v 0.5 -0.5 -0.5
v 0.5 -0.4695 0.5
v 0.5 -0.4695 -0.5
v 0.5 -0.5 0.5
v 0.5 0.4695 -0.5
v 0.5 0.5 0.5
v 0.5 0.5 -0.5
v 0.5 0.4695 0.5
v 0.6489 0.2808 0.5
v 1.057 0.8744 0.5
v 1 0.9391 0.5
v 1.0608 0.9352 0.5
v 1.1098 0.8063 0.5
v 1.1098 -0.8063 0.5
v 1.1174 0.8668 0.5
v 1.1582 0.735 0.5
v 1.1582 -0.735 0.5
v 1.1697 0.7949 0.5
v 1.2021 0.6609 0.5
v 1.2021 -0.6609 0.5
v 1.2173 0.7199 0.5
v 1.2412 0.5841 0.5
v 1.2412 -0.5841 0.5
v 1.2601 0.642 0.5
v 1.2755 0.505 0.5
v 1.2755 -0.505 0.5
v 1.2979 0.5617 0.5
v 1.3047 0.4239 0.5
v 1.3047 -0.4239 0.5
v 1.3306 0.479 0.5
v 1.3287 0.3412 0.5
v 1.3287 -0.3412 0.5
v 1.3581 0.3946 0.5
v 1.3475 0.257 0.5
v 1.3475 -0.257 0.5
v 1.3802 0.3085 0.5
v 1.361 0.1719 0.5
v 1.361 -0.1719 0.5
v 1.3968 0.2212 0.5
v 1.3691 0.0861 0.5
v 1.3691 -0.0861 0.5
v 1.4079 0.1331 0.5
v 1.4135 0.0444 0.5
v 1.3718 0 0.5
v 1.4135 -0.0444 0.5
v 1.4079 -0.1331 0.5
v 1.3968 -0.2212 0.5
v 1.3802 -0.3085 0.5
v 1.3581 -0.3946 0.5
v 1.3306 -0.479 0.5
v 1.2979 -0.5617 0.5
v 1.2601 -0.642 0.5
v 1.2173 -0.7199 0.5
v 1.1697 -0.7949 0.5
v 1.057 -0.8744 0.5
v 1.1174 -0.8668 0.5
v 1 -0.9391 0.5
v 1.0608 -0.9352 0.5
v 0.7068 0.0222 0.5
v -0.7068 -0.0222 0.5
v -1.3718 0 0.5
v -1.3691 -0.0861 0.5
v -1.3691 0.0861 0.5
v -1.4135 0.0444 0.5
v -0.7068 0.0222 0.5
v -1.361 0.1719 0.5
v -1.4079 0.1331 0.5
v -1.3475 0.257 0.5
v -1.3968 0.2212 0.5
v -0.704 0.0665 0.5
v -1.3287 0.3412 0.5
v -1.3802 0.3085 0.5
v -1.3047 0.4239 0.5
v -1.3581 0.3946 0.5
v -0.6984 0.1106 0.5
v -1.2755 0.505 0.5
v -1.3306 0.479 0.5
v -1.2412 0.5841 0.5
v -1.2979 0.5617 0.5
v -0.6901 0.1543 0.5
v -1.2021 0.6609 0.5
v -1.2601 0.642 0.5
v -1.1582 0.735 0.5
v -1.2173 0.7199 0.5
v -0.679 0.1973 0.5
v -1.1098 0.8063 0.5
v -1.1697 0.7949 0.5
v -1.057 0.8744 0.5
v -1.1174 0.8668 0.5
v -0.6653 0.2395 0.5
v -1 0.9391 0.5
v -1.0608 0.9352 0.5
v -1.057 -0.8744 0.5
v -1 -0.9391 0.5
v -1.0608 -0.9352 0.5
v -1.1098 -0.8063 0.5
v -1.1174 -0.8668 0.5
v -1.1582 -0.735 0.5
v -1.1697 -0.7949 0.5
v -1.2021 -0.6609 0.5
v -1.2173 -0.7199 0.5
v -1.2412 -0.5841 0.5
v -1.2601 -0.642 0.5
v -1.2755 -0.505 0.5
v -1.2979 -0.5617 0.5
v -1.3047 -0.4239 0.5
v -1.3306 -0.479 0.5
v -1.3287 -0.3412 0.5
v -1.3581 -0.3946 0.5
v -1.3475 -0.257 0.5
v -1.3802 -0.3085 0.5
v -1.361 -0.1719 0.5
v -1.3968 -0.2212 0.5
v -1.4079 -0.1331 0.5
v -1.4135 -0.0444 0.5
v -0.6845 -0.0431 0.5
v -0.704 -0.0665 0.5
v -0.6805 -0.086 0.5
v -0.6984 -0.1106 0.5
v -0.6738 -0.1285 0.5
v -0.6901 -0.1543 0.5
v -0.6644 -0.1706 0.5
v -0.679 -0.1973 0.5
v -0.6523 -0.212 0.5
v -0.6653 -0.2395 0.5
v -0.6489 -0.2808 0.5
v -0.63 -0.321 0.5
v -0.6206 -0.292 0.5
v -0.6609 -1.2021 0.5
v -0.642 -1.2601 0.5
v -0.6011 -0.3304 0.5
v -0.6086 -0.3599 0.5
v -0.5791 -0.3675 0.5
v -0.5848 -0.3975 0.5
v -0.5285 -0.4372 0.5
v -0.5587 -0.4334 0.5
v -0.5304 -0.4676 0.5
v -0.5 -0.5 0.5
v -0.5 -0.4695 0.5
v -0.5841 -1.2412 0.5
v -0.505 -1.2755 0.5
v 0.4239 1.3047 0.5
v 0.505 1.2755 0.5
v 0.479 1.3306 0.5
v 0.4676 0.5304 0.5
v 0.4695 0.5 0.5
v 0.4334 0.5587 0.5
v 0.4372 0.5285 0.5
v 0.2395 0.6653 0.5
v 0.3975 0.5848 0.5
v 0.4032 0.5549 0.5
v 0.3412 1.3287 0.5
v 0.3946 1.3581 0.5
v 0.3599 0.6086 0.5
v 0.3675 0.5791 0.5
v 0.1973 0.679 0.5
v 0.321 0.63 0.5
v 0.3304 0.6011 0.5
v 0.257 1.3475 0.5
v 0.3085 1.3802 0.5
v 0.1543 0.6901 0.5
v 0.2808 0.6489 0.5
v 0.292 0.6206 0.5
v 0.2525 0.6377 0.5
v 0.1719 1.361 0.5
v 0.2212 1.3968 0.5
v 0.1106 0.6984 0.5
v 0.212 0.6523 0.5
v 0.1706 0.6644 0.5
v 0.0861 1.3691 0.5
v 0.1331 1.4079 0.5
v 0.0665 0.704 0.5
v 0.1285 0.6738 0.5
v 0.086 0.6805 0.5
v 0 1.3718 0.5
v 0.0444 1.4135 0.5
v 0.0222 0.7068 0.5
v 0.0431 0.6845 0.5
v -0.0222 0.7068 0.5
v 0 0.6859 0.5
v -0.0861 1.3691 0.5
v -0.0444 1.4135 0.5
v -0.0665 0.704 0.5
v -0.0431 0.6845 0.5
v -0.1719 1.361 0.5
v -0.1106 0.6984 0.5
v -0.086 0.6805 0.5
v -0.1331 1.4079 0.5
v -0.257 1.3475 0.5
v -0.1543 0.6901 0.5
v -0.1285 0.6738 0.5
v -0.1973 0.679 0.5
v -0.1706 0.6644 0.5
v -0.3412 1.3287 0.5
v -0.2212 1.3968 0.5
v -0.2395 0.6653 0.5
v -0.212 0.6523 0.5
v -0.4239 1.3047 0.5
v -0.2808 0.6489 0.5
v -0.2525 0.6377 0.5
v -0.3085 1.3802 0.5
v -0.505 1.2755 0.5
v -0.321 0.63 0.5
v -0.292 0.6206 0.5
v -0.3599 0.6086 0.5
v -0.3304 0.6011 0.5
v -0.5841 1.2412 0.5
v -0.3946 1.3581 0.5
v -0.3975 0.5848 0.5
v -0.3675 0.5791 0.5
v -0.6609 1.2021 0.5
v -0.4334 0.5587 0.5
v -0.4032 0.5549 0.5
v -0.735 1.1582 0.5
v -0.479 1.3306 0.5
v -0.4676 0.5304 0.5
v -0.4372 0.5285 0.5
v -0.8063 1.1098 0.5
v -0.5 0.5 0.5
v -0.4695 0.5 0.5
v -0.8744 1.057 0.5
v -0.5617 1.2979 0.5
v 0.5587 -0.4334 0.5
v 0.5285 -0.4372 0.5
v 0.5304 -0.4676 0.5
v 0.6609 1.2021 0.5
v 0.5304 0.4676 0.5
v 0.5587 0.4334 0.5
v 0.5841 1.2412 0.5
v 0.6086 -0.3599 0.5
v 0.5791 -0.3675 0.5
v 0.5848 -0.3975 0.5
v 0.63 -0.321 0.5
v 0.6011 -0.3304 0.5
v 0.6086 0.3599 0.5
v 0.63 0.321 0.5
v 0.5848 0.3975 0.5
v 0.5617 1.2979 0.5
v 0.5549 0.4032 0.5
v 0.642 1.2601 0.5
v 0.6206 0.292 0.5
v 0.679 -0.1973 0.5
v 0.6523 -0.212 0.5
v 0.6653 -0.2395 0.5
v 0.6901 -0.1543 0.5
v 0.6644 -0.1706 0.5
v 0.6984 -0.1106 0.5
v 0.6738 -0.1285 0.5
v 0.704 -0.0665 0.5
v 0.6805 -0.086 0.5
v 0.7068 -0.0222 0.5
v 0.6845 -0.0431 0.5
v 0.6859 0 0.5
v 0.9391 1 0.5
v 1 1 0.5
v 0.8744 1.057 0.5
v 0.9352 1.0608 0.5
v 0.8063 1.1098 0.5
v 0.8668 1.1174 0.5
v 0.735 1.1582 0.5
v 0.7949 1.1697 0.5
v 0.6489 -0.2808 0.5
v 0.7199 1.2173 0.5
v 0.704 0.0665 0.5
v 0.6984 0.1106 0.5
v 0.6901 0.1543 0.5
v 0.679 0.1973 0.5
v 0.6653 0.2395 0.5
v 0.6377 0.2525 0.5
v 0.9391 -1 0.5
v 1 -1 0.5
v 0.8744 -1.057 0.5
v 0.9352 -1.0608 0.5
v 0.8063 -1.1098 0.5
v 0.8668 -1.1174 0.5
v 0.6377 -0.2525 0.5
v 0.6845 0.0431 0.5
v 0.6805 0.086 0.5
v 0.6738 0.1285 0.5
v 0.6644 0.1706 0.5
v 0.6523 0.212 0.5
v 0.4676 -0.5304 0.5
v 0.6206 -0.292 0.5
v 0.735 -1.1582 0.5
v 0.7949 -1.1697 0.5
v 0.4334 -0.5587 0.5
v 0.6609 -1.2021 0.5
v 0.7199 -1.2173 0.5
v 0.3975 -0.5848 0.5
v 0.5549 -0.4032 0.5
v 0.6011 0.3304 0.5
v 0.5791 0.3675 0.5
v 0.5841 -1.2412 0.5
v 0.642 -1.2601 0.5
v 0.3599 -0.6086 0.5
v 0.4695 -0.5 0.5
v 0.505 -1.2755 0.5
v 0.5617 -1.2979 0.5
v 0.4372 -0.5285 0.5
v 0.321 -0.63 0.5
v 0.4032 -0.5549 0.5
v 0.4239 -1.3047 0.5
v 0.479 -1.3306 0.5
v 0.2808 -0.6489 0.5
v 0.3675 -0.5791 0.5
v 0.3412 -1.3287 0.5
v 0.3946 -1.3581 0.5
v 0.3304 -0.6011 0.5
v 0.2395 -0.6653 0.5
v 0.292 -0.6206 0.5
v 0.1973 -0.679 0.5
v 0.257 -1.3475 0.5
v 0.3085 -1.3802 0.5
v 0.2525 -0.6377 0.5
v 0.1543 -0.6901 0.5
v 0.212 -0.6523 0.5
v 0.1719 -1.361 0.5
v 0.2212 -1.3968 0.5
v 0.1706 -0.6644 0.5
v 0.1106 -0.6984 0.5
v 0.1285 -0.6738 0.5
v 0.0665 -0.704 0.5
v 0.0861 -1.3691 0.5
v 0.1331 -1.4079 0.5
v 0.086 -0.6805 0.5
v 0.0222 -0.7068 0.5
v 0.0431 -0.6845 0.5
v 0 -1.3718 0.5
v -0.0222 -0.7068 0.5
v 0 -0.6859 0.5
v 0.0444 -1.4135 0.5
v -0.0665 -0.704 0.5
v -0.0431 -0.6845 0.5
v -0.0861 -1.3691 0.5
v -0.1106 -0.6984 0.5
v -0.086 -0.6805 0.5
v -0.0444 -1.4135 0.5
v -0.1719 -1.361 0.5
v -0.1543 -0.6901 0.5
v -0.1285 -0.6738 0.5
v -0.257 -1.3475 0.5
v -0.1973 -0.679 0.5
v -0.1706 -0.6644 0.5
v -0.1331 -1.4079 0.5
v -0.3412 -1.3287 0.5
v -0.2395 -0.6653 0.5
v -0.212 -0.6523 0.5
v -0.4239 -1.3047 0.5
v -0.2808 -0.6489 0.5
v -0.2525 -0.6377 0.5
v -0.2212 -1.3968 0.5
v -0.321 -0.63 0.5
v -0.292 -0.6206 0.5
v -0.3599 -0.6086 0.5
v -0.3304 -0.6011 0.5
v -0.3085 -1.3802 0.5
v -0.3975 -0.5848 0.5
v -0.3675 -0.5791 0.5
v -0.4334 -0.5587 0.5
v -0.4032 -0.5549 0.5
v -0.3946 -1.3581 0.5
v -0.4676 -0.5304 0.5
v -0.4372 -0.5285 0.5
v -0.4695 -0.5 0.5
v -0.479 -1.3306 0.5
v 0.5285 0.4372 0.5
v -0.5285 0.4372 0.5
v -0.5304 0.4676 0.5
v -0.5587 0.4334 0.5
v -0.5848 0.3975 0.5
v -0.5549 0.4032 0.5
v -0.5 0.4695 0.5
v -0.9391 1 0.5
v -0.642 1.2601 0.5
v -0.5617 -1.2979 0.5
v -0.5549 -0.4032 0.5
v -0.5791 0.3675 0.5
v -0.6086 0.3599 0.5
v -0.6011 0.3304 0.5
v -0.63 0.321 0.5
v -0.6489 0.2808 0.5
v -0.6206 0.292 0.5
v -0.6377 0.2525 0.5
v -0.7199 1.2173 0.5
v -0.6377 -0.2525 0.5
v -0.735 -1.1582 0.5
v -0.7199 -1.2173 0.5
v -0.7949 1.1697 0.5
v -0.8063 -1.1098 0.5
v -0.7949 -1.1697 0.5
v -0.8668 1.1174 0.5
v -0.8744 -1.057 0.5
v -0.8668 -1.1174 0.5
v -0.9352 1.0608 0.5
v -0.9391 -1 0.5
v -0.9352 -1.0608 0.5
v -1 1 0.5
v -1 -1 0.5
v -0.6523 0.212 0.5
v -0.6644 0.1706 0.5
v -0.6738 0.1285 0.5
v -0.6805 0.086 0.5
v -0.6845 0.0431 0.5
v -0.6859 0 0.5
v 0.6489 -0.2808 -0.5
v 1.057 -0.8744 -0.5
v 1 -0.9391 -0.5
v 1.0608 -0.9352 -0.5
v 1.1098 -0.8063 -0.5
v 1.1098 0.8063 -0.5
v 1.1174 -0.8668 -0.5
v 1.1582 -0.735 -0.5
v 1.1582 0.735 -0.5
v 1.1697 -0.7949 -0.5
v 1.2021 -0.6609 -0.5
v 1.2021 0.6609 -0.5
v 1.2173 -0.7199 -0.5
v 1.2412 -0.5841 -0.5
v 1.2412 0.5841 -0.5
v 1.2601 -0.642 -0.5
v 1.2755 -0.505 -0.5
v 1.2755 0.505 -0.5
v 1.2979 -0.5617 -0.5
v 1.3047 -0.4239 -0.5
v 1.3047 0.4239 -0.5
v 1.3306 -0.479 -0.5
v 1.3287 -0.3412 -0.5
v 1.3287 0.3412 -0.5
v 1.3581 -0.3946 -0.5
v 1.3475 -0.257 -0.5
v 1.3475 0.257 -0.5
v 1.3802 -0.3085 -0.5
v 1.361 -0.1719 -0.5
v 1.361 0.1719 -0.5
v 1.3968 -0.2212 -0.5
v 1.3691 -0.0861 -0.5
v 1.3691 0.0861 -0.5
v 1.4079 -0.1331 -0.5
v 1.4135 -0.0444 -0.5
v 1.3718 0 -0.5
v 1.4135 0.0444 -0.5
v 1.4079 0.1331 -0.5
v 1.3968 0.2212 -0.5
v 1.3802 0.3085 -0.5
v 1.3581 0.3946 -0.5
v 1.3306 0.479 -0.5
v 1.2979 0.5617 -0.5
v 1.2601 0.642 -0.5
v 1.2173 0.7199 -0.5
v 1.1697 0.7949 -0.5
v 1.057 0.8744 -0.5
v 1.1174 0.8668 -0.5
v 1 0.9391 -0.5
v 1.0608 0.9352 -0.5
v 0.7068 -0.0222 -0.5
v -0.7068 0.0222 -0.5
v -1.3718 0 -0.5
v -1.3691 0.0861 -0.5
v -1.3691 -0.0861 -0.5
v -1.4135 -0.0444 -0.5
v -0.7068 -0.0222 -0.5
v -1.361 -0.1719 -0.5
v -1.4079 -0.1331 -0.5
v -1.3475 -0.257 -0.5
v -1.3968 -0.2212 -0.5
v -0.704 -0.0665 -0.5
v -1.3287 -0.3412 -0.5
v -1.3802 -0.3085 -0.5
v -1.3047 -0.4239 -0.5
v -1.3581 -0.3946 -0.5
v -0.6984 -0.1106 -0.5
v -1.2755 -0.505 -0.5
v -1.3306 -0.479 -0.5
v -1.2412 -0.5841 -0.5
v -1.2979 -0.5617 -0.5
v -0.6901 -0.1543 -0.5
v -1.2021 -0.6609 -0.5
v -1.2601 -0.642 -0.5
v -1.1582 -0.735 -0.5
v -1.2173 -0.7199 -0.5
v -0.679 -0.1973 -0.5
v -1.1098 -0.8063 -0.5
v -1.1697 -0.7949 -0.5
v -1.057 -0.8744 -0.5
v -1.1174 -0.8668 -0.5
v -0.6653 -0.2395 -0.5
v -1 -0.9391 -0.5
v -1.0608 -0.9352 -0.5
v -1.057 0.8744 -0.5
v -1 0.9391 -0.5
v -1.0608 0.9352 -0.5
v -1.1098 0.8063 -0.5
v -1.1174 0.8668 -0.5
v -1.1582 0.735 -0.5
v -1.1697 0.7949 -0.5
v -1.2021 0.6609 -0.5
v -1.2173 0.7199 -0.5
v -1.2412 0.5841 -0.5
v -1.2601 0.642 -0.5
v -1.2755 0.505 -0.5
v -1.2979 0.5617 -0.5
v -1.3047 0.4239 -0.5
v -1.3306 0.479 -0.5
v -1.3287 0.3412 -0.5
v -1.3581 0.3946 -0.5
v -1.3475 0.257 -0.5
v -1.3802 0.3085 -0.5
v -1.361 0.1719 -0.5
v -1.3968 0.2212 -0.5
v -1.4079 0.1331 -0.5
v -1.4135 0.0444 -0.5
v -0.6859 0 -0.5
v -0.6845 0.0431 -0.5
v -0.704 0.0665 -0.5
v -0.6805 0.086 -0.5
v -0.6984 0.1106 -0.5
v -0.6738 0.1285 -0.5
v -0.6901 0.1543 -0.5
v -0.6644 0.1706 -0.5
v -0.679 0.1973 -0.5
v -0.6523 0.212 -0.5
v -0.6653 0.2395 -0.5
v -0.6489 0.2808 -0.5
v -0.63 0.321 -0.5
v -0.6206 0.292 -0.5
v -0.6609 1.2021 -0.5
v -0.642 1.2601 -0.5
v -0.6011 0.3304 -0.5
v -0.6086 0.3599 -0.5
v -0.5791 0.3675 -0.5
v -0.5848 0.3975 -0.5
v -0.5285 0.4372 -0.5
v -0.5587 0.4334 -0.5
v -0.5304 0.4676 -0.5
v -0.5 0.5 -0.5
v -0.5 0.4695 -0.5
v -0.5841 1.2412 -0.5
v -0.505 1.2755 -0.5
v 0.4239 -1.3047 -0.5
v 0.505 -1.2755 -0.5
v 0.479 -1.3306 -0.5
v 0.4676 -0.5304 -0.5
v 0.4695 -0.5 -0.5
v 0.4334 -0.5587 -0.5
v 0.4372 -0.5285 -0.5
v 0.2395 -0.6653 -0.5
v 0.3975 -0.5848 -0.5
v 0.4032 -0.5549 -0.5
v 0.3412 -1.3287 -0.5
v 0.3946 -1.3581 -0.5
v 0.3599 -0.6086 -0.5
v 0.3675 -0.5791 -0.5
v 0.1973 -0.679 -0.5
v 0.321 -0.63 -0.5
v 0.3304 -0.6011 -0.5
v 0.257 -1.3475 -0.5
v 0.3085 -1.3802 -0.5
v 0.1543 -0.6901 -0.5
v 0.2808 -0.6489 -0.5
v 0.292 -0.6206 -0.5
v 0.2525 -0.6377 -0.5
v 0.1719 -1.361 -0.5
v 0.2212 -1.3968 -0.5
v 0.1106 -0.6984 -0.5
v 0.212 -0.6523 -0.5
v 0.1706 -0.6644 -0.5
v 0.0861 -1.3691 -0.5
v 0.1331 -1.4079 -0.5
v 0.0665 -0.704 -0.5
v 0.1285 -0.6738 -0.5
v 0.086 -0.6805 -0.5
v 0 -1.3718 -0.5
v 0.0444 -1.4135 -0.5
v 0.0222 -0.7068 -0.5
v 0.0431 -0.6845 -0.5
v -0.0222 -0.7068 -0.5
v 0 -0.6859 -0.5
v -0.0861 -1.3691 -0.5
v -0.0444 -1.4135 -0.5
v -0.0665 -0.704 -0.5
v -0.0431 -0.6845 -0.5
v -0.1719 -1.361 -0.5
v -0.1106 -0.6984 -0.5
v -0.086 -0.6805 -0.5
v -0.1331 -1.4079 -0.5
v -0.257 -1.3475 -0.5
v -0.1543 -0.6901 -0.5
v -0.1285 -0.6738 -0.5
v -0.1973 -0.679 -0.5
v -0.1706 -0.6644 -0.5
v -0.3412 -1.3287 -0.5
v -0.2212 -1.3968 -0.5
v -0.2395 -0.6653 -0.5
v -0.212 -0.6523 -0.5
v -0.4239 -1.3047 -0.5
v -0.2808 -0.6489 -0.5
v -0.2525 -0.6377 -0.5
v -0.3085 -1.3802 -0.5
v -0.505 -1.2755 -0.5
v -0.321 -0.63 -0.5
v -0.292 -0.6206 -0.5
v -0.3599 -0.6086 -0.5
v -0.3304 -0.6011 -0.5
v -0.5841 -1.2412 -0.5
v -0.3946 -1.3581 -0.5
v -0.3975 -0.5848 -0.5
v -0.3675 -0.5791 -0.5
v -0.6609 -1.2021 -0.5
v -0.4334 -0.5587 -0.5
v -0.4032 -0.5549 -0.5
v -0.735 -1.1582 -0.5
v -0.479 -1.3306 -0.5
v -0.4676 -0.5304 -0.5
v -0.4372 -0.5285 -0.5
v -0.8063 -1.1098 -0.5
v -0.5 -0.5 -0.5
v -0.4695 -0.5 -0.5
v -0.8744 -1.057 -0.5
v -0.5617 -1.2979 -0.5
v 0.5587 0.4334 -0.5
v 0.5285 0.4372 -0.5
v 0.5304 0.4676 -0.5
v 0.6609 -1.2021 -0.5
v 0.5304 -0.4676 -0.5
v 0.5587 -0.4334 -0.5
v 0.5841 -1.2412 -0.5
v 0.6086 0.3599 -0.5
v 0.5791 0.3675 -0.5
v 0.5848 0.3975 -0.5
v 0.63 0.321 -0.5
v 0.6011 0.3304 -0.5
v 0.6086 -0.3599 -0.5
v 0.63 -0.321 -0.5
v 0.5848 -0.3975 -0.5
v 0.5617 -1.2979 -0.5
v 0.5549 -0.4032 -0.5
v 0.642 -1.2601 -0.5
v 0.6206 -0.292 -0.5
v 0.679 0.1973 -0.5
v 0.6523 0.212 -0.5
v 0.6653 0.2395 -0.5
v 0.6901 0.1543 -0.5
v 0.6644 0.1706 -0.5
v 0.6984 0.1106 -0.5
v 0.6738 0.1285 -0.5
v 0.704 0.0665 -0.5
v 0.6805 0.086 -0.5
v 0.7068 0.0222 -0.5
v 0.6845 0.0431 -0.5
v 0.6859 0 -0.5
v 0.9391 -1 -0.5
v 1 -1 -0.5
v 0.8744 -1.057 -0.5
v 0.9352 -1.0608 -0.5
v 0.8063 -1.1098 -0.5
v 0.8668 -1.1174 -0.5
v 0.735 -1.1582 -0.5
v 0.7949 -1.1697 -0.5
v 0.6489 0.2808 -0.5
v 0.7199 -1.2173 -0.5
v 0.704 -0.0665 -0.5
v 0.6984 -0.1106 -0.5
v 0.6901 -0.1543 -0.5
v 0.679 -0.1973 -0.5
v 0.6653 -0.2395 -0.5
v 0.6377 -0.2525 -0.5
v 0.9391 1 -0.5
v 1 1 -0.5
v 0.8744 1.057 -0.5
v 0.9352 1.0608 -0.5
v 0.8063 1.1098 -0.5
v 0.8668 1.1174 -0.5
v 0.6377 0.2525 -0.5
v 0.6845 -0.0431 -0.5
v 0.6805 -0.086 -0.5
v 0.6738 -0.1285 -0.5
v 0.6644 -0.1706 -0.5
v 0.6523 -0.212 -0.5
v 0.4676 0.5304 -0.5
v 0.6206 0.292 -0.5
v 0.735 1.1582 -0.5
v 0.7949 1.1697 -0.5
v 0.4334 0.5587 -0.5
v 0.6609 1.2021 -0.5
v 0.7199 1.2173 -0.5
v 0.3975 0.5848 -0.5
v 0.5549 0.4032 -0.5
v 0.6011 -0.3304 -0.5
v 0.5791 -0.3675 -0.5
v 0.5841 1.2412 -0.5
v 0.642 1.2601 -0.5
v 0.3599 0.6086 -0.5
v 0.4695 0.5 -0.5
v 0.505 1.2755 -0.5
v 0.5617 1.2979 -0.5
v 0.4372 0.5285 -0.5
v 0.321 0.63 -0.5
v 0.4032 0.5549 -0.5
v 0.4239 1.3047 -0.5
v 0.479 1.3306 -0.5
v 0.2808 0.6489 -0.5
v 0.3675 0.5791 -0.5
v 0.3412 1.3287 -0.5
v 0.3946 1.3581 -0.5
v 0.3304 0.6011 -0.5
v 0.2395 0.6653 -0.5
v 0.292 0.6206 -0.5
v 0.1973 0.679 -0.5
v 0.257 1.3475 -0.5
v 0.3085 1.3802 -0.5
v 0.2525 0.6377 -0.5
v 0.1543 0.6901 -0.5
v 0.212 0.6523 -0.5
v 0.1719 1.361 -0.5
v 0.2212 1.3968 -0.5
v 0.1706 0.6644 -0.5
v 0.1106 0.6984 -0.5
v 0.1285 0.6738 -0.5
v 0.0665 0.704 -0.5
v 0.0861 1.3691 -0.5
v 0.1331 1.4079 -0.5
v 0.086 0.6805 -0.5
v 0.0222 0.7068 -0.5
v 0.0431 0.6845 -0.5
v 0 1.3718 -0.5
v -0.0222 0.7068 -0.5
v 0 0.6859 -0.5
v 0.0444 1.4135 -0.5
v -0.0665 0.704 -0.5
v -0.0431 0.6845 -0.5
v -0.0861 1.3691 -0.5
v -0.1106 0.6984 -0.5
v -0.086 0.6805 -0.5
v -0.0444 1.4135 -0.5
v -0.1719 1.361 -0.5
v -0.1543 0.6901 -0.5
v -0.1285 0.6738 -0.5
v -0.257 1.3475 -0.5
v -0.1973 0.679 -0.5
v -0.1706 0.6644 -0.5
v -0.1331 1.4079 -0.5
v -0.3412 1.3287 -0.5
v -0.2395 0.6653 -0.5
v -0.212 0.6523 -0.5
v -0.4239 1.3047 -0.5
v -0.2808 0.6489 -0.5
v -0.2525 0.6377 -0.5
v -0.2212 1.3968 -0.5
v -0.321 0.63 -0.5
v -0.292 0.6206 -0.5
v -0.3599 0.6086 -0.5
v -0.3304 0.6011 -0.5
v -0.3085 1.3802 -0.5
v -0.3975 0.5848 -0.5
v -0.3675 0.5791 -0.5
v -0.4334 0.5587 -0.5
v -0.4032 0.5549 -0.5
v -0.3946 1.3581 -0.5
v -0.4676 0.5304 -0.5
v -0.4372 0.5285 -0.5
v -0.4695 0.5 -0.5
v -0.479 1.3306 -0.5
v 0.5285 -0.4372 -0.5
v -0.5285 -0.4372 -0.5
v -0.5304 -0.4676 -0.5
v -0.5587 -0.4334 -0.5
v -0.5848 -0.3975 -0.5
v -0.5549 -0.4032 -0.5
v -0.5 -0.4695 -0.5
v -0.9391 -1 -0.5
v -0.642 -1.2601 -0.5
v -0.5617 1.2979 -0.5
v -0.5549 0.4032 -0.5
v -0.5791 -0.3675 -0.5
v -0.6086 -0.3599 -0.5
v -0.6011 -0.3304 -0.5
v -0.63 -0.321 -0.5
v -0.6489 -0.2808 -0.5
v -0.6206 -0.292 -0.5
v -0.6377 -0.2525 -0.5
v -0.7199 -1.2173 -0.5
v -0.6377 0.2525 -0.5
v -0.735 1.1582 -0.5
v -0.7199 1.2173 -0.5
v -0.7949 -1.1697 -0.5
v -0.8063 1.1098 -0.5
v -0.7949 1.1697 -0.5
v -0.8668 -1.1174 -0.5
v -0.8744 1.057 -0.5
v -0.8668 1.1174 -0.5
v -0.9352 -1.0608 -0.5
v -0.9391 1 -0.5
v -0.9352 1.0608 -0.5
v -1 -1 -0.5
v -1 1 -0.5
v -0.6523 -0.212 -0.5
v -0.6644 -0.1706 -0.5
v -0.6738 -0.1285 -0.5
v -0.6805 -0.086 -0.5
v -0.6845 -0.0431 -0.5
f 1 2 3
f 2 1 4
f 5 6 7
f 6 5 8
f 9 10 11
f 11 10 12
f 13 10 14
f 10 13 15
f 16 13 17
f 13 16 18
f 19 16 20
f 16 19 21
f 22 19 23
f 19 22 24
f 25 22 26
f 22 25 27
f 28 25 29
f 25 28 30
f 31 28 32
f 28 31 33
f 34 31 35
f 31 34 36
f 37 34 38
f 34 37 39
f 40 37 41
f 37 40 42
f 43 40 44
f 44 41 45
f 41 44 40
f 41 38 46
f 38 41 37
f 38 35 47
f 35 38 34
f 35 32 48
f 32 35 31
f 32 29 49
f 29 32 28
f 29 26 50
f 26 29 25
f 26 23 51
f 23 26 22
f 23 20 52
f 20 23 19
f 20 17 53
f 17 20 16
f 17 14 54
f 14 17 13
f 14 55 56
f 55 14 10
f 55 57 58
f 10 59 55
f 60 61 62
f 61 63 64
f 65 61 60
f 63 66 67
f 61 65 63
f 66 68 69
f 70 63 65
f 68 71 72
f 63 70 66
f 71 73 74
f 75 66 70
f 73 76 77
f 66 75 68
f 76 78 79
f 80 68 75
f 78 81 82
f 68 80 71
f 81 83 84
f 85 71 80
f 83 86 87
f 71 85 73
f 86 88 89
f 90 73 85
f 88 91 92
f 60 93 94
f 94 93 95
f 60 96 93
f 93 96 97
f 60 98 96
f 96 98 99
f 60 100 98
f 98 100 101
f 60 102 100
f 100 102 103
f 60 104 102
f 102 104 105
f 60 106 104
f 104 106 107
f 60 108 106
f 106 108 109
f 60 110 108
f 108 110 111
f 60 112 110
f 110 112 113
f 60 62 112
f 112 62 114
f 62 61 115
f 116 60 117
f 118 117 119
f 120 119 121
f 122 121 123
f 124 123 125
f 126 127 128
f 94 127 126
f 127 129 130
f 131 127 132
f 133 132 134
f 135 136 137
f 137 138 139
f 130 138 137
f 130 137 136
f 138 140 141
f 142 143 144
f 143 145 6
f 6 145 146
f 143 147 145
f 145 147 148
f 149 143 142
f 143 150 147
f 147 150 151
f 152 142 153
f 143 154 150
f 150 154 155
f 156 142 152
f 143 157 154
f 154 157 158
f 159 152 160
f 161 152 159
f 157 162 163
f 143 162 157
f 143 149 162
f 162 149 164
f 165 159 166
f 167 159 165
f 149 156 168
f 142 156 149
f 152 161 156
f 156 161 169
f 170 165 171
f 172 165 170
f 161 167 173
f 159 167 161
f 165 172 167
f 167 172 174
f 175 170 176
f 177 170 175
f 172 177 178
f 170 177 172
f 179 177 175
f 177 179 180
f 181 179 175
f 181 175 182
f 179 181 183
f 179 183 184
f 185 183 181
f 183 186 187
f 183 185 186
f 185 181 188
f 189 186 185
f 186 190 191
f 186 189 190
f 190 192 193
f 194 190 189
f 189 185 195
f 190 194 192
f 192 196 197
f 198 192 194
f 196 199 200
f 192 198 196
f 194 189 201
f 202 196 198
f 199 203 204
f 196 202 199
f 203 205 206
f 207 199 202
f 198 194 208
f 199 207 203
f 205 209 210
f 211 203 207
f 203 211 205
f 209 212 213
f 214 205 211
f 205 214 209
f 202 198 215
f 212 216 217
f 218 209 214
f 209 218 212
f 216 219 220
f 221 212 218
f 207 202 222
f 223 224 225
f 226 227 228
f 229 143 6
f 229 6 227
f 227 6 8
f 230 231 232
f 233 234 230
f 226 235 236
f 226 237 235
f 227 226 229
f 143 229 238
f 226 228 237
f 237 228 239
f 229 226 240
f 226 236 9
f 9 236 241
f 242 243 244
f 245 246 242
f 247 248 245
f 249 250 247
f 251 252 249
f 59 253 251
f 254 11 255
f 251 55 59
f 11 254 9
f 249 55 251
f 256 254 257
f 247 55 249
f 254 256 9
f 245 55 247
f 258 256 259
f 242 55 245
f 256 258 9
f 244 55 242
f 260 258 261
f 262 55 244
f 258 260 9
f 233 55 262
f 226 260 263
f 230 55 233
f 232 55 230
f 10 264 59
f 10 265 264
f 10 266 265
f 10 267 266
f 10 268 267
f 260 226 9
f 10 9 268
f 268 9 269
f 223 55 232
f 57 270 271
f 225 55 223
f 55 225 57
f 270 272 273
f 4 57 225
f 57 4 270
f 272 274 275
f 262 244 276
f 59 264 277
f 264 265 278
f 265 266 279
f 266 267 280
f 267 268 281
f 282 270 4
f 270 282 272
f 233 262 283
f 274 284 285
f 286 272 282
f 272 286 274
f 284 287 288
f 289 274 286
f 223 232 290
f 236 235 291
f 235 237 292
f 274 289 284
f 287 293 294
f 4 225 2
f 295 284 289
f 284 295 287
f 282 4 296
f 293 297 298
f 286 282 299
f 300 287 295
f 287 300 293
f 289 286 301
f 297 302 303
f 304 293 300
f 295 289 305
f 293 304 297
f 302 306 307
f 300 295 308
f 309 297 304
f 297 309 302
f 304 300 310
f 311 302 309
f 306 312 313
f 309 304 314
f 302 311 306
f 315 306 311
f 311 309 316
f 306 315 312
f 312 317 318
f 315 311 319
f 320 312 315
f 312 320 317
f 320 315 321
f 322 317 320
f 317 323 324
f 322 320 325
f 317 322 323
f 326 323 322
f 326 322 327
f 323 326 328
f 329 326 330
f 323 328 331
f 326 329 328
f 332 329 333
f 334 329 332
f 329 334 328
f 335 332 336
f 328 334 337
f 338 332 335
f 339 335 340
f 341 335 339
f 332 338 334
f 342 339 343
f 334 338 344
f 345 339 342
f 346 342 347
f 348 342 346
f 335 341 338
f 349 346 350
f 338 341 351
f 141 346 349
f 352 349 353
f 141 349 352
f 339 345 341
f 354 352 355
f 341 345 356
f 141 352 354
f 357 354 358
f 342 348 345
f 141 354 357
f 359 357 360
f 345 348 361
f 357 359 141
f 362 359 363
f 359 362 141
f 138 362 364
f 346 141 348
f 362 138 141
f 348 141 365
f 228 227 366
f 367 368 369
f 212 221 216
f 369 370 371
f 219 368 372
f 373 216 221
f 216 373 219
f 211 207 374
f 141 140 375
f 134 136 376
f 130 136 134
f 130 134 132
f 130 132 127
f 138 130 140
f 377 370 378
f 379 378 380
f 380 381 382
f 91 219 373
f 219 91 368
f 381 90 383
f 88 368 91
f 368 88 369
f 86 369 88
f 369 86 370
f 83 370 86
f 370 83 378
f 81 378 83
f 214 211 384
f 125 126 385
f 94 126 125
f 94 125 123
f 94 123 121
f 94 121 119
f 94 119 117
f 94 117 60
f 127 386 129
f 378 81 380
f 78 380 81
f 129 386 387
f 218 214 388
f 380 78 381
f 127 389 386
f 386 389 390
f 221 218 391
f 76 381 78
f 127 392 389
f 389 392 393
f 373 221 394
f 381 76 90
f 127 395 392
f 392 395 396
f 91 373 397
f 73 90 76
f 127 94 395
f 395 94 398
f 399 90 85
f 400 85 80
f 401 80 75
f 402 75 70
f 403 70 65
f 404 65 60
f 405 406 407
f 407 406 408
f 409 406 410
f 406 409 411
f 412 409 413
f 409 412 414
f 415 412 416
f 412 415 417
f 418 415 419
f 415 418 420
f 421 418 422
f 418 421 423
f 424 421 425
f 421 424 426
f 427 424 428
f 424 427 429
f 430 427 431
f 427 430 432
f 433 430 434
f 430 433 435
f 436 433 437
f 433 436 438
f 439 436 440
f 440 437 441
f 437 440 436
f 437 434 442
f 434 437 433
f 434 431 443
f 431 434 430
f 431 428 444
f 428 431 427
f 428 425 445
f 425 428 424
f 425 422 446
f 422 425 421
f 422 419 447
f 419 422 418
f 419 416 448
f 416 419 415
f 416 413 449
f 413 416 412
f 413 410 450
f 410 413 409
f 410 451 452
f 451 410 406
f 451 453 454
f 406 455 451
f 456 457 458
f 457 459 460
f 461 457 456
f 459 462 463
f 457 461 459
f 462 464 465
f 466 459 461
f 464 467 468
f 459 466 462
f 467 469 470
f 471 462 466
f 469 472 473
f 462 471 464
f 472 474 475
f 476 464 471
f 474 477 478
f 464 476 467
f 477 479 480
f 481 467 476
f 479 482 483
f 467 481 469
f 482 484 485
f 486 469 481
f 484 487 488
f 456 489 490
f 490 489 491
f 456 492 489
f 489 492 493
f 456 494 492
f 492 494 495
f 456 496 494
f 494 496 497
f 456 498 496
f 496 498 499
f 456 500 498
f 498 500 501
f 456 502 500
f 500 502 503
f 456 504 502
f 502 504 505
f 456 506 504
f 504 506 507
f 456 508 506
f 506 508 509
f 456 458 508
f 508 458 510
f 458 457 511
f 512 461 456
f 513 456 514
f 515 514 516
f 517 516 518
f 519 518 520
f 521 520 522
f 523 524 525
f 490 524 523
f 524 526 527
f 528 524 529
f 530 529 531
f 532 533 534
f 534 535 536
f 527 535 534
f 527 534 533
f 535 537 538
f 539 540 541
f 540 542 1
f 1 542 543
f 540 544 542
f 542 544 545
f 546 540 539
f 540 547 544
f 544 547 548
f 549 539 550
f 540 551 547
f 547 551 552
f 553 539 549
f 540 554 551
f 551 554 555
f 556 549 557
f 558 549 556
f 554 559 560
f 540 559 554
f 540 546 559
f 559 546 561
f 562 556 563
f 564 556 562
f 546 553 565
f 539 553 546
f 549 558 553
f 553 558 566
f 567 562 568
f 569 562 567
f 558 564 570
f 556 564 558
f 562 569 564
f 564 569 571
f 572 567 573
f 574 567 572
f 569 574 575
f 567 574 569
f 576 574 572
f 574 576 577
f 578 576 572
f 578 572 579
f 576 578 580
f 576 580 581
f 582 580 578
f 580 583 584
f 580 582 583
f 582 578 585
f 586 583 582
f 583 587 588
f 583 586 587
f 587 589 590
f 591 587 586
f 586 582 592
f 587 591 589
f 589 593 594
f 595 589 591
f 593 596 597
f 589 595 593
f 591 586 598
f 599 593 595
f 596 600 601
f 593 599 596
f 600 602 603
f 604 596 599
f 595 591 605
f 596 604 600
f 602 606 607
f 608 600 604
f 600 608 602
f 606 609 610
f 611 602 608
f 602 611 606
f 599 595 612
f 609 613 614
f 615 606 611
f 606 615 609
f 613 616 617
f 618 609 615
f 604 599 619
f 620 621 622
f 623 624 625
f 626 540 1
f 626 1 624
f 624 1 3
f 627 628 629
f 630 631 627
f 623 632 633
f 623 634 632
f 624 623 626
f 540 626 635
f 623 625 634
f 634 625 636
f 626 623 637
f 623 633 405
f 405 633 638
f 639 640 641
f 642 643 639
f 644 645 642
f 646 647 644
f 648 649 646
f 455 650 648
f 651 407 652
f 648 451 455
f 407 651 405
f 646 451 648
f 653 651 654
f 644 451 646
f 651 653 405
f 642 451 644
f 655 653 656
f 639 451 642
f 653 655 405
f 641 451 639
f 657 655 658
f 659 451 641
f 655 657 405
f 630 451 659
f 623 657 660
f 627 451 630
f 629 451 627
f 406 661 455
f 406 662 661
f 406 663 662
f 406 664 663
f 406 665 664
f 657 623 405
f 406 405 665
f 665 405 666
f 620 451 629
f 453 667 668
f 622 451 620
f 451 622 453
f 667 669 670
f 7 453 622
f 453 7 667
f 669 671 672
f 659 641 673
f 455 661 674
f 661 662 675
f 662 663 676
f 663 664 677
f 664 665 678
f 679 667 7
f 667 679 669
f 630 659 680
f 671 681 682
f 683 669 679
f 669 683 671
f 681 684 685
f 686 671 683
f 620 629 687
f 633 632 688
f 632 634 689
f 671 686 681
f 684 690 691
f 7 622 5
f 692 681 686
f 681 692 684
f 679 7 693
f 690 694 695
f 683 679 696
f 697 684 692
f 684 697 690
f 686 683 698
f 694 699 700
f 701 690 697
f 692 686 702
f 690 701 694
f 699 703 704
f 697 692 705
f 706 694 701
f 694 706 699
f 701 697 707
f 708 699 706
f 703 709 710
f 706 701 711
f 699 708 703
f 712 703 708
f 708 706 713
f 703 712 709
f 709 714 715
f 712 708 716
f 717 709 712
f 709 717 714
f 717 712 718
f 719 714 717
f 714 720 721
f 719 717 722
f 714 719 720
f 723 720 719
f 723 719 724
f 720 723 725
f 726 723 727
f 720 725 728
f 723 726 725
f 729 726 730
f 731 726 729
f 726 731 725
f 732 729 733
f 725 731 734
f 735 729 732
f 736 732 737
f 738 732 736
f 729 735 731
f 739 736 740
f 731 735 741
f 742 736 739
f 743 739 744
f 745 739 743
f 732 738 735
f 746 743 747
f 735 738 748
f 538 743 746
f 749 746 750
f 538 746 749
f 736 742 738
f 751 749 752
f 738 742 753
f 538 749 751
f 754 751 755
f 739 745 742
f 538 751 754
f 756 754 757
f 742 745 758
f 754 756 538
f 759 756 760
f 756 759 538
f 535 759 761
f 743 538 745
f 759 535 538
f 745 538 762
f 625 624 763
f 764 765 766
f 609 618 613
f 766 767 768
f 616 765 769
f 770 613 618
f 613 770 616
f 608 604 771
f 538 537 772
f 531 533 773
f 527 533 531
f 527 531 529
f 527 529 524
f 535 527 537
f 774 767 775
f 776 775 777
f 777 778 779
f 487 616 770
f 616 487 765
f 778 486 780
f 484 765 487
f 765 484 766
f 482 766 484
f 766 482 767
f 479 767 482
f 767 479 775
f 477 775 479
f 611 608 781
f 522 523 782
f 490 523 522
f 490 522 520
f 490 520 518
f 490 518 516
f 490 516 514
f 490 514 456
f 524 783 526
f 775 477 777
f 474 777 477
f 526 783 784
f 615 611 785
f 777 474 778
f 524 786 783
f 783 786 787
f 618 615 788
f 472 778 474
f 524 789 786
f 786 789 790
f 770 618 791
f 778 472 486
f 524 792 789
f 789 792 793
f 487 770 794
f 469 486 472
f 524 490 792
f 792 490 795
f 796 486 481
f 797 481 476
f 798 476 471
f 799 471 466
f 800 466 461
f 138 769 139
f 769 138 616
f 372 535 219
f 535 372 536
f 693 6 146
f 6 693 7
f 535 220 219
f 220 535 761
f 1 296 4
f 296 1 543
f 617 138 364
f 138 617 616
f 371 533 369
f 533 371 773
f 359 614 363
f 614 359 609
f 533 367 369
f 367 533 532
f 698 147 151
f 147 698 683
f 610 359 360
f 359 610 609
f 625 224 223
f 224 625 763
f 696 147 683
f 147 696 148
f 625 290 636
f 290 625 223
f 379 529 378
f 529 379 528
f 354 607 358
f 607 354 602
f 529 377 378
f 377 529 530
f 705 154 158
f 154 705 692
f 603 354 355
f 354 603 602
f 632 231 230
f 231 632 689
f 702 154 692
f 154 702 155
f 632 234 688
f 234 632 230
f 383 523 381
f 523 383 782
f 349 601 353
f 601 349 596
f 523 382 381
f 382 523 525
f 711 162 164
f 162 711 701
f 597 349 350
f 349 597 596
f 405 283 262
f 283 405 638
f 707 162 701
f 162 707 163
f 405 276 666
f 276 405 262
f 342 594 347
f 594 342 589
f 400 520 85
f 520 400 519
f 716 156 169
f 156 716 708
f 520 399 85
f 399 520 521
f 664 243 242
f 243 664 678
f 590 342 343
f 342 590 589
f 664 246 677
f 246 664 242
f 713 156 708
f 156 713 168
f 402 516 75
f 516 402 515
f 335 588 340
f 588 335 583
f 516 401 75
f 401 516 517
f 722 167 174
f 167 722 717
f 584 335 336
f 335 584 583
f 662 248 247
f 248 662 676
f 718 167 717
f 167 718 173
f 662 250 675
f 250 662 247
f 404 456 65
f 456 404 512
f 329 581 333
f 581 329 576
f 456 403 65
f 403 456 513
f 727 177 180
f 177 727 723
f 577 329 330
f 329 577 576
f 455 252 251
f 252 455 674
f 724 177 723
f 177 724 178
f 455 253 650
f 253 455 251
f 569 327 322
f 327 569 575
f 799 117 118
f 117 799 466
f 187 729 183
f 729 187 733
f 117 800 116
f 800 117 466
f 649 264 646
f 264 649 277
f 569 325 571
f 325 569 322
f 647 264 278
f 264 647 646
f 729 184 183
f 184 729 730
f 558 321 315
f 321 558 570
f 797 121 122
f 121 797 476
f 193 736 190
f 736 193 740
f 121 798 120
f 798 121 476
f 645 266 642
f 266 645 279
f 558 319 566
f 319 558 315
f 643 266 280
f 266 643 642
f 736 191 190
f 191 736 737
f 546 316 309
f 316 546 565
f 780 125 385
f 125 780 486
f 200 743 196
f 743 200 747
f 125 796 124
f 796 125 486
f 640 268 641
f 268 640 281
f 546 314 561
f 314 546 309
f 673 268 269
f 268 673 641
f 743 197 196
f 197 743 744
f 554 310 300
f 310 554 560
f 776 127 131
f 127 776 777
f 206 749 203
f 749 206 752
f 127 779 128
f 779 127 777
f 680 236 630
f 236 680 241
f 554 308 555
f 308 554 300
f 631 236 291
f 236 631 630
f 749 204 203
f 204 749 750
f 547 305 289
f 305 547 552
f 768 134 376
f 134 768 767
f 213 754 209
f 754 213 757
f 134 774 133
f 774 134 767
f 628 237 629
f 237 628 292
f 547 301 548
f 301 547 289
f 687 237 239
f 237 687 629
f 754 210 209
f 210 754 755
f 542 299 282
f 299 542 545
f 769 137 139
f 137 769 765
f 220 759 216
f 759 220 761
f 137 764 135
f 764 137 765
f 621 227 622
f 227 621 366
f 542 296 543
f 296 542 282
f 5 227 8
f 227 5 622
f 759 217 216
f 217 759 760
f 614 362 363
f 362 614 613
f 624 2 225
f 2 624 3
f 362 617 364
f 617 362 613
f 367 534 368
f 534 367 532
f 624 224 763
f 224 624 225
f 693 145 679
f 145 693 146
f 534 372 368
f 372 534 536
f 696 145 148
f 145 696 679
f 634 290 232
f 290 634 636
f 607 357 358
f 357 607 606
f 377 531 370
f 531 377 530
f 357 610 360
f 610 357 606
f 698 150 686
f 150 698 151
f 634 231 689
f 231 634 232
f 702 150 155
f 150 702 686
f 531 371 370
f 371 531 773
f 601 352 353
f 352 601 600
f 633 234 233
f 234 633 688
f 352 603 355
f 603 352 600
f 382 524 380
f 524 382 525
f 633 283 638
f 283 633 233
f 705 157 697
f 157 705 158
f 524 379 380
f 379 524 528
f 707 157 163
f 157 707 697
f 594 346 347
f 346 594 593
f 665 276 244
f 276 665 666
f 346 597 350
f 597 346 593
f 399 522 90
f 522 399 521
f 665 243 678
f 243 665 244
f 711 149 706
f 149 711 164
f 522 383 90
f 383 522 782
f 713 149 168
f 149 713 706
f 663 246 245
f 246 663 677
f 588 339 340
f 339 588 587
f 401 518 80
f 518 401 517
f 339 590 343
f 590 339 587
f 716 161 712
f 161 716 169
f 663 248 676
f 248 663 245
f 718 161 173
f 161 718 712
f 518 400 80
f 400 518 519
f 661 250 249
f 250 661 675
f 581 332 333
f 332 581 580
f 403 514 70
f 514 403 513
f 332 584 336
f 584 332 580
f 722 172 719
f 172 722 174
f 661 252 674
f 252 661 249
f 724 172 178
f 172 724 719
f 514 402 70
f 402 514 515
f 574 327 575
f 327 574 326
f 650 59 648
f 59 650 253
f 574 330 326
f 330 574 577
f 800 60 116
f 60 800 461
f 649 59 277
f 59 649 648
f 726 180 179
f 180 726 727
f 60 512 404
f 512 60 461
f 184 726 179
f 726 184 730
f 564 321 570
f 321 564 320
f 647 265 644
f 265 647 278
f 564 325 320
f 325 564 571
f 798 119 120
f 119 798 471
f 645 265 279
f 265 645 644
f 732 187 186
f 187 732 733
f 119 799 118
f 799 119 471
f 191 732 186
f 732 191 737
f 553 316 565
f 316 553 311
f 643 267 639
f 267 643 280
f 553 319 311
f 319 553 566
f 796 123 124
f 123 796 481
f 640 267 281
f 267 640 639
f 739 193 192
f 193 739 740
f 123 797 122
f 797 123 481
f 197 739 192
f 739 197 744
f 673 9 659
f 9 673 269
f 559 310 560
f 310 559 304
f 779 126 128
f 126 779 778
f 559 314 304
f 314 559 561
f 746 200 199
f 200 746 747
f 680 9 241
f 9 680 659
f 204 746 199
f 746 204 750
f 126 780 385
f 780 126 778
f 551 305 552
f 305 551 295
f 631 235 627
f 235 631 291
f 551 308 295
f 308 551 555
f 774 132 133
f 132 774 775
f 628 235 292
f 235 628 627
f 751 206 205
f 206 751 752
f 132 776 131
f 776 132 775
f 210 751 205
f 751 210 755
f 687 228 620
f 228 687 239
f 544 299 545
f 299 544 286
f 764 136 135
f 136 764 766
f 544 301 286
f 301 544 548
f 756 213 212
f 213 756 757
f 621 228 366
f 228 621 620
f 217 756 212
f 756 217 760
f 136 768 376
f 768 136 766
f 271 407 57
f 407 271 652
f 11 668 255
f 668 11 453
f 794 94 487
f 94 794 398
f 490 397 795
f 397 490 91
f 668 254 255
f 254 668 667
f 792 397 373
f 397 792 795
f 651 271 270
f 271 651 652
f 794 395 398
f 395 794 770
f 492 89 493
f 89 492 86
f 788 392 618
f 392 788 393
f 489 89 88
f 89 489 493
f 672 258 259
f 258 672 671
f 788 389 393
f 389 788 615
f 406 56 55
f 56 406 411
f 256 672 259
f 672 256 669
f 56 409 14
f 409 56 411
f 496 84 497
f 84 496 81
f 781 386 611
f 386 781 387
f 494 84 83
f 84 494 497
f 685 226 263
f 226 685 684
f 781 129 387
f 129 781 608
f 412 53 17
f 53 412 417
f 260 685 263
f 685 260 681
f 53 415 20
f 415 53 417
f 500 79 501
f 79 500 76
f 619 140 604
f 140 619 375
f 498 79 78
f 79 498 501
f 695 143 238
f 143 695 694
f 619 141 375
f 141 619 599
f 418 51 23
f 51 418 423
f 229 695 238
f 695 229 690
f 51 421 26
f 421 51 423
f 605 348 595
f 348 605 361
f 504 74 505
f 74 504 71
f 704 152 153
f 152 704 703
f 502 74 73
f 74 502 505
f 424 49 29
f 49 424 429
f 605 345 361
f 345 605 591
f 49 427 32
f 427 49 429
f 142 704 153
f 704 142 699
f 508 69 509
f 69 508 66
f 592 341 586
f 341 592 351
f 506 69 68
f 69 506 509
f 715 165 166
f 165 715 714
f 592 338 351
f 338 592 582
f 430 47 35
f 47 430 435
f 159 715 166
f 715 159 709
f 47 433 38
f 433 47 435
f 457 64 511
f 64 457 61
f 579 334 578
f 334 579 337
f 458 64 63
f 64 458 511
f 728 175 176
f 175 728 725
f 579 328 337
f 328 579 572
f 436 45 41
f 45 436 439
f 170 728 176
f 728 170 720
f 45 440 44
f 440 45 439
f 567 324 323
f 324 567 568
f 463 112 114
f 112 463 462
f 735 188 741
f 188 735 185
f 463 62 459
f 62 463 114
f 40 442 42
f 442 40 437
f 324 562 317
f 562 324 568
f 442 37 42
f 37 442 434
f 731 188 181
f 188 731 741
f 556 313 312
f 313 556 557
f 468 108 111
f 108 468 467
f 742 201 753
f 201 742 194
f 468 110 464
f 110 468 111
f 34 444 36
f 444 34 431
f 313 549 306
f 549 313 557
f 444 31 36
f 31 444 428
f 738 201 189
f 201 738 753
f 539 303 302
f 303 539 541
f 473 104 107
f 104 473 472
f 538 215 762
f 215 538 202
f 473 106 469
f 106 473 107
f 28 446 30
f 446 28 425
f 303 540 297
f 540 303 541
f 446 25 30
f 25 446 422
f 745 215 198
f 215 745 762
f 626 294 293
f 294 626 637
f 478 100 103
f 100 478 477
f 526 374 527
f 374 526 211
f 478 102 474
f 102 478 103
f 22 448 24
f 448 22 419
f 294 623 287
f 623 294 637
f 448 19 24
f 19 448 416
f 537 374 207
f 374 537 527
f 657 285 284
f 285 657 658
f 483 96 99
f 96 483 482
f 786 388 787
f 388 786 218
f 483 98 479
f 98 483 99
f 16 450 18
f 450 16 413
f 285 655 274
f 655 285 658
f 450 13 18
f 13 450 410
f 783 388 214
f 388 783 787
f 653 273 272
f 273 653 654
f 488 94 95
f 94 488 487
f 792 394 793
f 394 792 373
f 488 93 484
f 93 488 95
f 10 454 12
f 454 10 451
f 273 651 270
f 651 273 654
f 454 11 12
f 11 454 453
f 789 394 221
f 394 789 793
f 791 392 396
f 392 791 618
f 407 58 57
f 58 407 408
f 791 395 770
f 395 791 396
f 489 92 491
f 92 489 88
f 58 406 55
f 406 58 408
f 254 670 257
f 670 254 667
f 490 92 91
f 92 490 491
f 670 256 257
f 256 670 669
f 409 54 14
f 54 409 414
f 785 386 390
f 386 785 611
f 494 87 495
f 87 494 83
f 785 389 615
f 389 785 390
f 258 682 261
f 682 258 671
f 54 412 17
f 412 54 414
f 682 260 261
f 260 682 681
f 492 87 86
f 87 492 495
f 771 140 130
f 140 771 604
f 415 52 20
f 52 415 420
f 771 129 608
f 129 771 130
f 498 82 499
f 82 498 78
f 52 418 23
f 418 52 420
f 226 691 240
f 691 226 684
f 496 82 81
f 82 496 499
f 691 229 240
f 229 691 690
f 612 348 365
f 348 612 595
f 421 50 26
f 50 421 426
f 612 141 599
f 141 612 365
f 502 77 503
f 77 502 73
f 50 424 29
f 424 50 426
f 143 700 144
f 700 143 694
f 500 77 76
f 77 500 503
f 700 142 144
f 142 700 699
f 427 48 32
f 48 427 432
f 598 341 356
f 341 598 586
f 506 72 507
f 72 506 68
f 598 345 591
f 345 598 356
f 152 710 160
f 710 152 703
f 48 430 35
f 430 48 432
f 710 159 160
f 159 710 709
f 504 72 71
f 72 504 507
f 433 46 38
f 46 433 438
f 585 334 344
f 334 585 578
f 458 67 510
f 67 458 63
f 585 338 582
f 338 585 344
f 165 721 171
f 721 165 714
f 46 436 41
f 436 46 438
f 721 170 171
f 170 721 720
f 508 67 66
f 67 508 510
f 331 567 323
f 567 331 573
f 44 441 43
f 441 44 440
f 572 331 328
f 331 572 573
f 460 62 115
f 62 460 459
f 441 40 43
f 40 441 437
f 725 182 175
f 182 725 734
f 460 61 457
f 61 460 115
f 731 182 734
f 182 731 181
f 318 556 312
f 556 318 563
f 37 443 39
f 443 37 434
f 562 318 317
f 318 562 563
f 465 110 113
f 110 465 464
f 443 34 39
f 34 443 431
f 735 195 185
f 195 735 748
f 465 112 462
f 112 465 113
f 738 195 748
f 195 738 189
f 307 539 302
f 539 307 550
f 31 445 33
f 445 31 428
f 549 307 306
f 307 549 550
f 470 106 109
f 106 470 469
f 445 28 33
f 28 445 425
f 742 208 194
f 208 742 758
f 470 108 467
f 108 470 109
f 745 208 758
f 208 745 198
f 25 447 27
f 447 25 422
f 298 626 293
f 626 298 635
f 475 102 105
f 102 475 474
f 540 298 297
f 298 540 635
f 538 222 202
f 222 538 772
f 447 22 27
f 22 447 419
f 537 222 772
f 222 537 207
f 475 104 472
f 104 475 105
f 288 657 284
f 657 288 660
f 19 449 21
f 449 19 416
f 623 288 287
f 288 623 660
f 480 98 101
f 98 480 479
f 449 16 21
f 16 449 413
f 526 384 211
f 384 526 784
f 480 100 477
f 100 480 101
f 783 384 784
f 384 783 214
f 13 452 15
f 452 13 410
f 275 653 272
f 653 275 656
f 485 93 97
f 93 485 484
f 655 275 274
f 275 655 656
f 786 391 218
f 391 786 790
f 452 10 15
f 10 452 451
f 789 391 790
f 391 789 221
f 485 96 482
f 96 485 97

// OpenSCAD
module multi_rot_cube(N=10) {
   alpha=360/N;
   union() {
      for(i=[0:N-1]) {
         rotate(i*alpha)
            cube(center=true);
      }
   }
}


difference() {
   scale([2,2,1]) multi_rot_cube(N=50);
   multi_rot_cube(N=50);
}
   
